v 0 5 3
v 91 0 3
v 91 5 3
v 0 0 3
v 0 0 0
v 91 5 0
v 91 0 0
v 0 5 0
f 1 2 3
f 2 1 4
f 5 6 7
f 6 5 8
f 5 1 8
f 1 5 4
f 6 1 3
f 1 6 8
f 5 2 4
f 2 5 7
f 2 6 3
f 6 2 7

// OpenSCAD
translate([3.5, 2.5, 1.5]) color([0.028829116538094723, 0.04435252539911694, 0.3687041258820589]) cube([7, 5, 3], center=true);
translate([10.5, 2.5, 1.5]) color([0.20959132812878367, 0.5245146032105923, 0.1877850356496189]) cube([7, 5, 3], center=true);
translate([17.5, 2.5, 1.5]) color([0.2016215864664097, 0.6726678813176303, 0.7356026567617159]) cube([7, 5, 3], center=true);
translate([24.5, 2.5, 1.5]) color([0.31223209587410494, 0.8599943994333726, 0.2546391746557106]) cube([7, 5, 3], center=true);
translate([31.5, 2.5, 1.5]) color([0.34394037628155716, 0.712480390369609, 0.04450290132920964]) cube([7, 5, 3], center=true);
translate([38.5, 2.5, 1.5]) color([0.934183460116191, 0.07233773178762537, 0.4609310589380602]) cube([7, 5, 3], center=true);
translate([45.5, 2.5, 1.5]) color([0.7246048259600892, 0.04746853498479808, 0.8090026856371774]) cube([7, 5, 3], center=true);
translate([52.5, 2.5, 1.5]) color([0.9788933433114139, 0.460511672795628, 0.11812363628756806]) cube([7, 5, 3], center=true);
translate([59.5, 2.5, 1.5]) color([0.08147699565547994, 0.09873043616313526, 0.7654413741364753]) cube([7, 5, 3], center=true);
translate([66.5, 2.5, 1.5]) color([0.4140128484685186, 0.9192341581990311, 0.4406397760864845]) cube([7, 5, 3], center=true);
translate([73.5, 2.5, 1.5]) color([0.07714331014460807, 0.42693558751800065, 0.7548278934255565]) cube([7, 5, 3], center=true);
translate([78.0, 2.5, 1.5]) color([0.8293384268467949, 0.039351686529191854, 0.1803893912563338]) cube([2, 5, 3], center=true);
translate([80.0, 2.5, 1.5]) color([0.490013452023644, 0.12808547795160863, 0.8710926419421733]) cube([2, 5, 3], center=true);
translate([82.0, 2.5, 1.5]) color([0.9344608884461488, 0.3195969983538176, 0.43484368255202]) cube([2, 5, 3], center=true);
translate([84.0, 2.5, 1.5]) color([0.5570540644200566, 0.2855057910835891, 0.5410756974595614]) cube([2, 5, 3], center=true);
translate([86.0, 2.5, 1.5]) color([0.2011850454737838, 0.2966412512769129, 0.44178363318767744]) cube([2, 5, 3], center=true);
translate([88.0, 2.5, 1.5]) color([0.604669902191143, 0.5361650260862432, 0.2609879767339395]) cube([2, 5, 3], center=true);
translate([90.0, 2.5, 1.5]) color([0.23178787541805523, 0.11873023670071103, 0.7834936358921726]) cube([2, 5, 3], center=true);
